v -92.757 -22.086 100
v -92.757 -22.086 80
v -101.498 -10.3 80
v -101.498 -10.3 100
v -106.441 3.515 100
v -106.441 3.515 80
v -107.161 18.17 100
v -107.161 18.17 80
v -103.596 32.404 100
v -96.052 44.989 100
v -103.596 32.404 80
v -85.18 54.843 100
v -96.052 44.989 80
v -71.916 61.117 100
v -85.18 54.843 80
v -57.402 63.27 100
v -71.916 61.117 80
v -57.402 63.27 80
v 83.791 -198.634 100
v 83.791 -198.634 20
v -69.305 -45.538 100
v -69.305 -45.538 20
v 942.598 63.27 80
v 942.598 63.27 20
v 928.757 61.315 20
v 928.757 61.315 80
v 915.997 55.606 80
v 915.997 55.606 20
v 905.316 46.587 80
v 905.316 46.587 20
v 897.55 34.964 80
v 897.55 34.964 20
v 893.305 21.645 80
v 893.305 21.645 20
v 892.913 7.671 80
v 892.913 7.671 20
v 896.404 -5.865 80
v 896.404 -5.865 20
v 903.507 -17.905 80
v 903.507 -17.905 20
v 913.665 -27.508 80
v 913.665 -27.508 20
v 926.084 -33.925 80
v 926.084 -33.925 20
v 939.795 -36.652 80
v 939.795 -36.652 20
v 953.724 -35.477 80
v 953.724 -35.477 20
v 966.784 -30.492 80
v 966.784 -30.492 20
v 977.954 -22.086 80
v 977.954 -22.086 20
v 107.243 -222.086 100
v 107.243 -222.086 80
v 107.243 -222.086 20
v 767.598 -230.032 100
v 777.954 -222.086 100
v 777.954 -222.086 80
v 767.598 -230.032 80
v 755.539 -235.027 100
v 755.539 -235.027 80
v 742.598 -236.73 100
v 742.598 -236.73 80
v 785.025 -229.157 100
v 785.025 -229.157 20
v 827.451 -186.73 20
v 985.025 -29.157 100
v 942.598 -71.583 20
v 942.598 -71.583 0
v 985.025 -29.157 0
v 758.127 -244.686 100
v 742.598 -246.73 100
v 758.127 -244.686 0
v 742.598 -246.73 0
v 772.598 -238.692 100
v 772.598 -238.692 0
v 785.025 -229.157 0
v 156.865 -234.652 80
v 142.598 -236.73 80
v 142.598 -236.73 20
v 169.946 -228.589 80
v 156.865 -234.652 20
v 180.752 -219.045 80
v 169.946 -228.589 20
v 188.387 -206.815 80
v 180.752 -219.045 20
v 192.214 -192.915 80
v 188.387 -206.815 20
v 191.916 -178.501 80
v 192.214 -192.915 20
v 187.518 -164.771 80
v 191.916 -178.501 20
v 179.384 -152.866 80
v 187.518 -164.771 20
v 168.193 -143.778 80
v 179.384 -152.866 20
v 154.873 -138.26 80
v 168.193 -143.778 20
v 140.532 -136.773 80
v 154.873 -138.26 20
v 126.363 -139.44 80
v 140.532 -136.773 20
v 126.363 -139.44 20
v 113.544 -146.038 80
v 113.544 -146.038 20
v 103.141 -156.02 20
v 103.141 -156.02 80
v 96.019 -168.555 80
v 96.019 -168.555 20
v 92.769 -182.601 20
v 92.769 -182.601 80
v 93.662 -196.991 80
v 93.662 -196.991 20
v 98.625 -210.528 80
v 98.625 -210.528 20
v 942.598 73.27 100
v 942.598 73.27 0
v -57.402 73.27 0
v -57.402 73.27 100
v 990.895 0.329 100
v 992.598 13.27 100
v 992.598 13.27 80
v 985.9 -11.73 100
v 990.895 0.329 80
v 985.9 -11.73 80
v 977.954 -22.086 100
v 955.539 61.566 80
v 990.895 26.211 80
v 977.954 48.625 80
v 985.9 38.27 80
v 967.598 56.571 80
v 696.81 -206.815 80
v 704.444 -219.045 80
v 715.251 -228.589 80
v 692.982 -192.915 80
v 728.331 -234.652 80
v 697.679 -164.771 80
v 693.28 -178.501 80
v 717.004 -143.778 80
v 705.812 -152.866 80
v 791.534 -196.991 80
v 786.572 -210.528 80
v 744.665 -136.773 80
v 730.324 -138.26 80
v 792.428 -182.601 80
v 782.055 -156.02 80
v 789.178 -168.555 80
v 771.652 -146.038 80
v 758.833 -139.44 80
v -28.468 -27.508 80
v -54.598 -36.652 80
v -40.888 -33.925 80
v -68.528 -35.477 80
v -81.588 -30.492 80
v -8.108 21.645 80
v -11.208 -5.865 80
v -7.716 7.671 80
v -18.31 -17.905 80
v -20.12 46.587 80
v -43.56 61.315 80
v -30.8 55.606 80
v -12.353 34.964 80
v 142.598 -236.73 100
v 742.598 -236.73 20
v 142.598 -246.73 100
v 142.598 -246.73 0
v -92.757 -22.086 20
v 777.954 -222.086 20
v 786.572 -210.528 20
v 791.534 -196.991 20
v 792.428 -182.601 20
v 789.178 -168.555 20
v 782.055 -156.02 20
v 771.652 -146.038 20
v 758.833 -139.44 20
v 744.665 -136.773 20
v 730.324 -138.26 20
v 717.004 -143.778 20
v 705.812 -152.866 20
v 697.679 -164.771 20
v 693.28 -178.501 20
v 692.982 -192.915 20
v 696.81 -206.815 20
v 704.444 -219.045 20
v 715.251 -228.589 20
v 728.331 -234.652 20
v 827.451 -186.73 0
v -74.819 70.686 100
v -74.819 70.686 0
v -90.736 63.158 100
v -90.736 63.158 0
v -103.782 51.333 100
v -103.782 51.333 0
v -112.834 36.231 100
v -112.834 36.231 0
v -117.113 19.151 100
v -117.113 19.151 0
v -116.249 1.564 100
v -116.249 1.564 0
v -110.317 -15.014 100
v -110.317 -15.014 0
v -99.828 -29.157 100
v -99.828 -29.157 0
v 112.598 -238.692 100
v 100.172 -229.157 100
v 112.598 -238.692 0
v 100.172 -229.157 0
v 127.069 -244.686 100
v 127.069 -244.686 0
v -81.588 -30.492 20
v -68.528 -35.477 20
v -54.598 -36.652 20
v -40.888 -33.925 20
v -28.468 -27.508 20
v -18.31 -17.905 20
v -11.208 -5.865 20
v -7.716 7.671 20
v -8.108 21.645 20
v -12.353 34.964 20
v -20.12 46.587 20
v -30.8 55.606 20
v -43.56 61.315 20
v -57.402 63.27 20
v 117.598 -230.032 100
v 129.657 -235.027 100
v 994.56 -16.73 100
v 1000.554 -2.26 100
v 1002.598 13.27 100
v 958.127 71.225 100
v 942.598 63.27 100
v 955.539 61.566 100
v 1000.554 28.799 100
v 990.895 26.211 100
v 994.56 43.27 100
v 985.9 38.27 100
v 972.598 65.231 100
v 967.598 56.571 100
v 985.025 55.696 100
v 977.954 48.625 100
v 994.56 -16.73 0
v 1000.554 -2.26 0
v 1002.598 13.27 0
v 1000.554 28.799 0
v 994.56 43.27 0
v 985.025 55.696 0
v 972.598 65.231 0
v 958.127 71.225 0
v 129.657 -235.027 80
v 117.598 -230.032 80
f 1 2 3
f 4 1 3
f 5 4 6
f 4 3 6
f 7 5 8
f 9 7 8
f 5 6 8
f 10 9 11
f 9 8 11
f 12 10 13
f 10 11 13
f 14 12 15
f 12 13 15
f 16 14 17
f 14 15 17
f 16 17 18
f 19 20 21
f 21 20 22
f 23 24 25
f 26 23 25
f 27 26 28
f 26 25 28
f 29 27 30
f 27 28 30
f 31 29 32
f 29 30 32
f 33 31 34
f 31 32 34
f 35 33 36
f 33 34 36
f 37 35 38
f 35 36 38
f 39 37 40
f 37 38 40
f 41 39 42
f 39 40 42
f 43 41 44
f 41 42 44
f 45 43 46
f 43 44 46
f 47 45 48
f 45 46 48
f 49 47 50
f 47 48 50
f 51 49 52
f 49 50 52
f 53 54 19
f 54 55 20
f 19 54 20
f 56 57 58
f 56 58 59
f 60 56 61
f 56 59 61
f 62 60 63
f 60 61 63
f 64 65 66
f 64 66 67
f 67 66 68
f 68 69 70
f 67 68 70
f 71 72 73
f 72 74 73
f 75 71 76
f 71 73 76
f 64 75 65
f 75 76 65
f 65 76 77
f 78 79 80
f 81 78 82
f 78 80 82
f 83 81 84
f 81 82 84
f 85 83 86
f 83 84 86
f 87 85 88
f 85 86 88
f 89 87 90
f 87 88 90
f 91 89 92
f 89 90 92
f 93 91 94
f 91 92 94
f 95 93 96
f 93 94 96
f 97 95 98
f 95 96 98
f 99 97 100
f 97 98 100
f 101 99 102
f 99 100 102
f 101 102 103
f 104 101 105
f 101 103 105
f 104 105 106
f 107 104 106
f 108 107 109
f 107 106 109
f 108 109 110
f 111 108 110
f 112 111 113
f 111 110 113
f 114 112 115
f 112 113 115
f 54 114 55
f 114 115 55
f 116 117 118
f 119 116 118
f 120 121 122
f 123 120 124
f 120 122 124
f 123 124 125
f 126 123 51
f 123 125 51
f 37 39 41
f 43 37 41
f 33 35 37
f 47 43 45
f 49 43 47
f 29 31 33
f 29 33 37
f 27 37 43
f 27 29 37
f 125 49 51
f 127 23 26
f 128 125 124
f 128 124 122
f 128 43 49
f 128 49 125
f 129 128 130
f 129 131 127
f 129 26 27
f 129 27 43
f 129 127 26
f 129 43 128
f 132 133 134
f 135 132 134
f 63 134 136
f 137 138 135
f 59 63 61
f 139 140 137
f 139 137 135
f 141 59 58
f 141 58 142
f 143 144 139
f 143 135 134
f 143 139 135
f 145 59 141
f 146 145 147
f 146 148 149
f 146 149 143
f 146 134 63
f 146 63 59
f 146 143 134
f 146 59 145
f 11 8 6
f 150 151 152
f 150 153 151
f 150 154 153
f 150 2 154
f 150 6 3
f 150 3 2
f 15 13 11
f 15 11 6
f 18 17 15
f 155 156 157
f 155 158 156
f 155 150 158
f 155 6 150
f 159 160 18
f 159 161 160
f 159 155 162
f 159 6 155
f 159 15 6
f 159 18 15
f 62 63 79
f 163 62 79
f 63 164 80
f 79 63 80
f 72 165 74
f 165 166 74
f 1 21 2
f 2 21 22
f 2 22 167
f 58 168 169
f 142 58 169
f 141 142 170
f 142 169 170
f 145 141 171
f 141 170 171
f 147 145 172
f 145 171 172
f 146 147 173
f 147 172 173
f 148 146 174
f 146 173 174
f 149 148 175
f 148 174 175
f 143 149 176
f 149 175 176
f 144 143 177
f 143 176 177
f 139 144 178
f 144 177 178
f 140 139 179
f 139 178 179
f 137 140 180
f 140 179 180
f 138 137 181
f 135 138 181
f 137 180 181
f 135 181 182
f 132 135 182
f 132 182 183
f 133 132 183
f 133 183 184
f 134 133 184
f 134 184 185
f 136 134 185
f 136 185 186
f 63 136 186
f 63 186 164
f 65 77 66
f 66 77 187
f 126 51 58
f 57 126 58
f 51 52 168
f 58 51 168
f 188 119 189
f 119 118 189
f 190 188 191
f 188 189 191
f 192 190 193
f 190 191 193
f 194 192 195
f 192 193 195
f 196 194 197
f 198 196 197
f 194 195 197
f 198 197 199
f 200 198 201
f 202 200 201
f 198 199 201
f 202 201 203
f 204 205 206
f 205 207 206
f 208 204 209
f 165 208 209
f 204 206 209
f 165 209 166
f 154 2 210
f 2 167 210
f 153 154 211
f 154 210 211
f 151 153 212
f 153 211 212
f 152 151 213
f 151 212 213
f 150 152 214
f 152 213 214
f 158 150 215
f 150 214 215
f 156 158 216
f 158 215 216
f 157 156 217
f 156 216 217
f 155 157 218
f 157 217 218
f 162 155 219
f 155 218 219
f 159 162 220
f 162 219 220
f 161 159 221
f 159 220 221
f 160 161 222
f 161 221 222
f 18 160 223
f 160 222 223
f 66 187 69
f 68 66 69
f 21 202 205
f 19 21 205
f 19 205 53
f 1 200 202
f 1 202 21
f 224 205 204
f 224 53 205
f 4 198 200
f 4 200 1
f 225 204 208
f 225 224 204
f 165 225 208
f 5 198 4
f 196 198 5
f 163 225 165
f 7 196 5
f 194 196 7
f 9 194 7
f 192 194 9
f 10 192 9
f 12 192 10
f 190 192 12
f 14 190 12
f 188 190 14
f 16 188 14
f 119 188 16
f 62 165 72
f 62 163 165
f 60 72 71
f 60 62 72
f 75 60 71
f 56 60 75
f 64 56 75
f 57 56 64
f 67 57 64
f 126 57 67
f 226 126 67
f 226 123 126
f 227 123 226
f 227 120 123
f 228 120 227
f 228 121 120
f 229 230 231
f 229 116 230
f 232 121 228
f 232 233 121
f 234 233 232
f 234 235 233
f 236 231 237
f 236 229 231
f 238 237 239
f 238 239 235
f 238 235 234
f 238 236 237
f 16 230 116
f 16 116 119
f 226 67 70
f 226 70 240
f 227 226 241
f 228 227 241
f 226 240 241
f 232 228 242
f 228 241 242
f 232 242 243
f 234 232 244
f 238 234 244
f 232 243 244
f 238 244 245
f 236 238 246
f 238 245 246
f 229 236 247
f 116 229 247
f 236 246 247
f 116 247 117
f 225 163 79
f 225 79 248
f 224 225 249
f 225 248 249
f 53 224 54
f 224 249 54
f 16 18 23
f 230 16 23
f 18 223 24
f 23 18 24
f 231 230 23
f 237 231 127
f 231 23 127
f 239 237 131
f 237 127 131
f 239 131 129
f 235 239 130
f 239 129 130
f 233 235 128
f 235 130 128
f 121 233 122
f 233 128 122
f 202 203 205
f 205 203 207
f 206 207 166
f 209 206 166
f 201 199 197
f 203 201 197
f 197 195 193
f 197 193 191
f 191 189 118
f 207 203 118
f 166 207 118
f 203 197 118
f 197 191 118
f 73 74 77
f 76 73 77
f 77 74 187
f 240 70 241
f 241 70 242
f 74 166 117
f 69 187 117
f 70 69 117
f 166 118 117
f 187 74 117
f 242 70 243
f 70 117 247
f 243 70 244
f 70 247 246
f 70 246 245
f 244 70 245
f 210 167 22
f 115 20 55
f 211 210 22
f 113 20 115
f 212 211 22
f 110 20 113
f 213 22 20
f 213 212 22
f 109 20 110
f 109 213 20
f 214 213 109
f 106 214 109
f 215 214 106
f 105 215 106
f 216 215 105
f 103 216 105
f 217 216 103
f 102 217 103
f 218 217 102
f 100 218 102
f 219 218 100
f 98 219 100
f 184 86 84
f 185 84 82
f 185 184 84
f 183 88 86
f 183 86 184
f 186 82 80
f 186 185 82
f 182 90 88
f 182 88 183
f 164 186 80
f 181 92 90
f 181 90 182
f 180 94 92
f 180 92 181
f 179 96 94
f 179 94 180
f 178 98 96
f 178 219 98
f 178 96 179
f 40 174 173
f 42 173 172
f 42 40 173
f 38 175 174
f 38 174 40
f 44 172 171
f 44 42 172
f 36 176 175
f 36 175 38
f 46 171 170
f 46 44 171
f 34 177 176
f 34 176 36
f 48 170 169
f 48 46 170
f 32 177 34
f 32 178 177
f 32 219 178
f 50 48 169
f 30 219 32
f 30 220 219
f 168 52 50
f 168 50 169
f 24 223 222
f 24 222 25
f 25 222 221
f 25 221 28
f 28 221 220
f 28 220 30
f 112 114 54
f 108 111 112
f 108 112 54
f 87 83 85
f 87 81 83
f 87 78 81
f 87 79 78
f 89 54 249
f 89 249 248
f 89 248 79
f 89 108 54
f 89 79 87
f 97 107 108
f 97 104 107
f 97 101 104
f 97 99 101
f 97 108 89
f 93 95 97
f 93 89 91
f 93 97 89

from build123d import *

# Parameters (mm, degrees)
BOSS_EXTRU_1_DEPTH = 20
ESQUISSE2_R        = 50
BOSS_EXTRU_2_DEPTH = 60
BOSS_EXTRU_3_DEPTH = 80


with BuildPart() as part:
    # Esquisse1 → Boss.-Extru.1 (new body)
    with BuildSketch(Plane.XY):
        with BuildLine():
            ThreePointArc((-57.401721965, 73.269601329), (-112.834493915, 36.230607271), (-99.828128836, -29.156805542))
            Line((-99.828128836, -29.156805542), (100.171871164, -229.156805542))
            ThreePointArc((100.171871164, -229.156805542), (119.637272093, -242.163170622), (142.598278035, -246.730398671))
            Line((142.598278035, -246.730398671), (742.598278035, -246.730398671))
            ThreePointArc((742.598278035, -246.730398671), (765.559283977, -242.163170622), (785.024684906, -229.156805542))
            Line((785.024684906, -229.156805542), (985.024684906, -29.156805542))
            ThreePointArc((985.024684906, -29.156805542), (998.031049986, 36.230607271), (942.598278035, 73.269601329))
            Line((942.598278035, 73.269601329), (-57.401721965, 73.269601329))
        make_face()
    extrude(amount=BOSS_EXTRU_1_DEPTH)

    # Esquisse2 → Boss.-Extru.2 (add)
    with BuildSketch(Plane.XY.offset(20)):
        with Locations((-57.401721965, 13.269601329)):
            Circle(ESQUISSE2_R)
        with Locations((942.598278035, 13.269601329)):
            Circle(ESQUISSE2_R)
        with Locations((142.598278035, -186.730398671)):
            Circle(ESQUISSE2_R)
        with Locations((742.598278035, -186.730398671)):
            Circle(ESQUISSE2_R)
    extrude(amount=BOSS_EXTRU_2_DEPTH)

    # Esquisse3 → Boss.-Extru.3 (add)
    with BuildSketch(Plane.XY.offset(20)):
        with BuildLine():
            Line((942.598278035, 73.269601329), (-57.401721965, 73.269601329))
            ThreePointArc((-57.401721965, 73.269601329), (-112.834493915, 36.230607271), (-99.828128836, -29.156805542))
            Line((-99.828128836, -29.156805542), (100.171871164, -229.156805542))
            ThreePointArc((100.171871164, -229.156805542), (119.637272093, -242.163170622), (142.598278035, -246.730398671))
            Line((142.598278035, -246.730398671), (742.598278035, -246.730398671))
            ThreePointArc((742.598278035, -246.730398671), (765.559283977, -242.163170622), (785.024684906, -229.156805542))
            Line((785.024684906, -229.156805542), (985.024684906, -29.156805542))
            ThreePointArc((985.024684906, -29.156805542), (998.031049986, 36.230607271), (942.598278035, 73.269601329))
        make_face()
        with BuildLine():
            ThreePointArc((942.598278035, 63.269601329), (988.792254661, 32.403772947), (977.953617095, -22.08573773))
            Line((977.953617095, -22.08573773), (777.953617095, -222.08573773))
            ThreePointArc((777.953617095, -222.08573773), (761.732449653, -232.924375297), (742.598278035, -236.730398671))
            Line((742.598278035, -236.730398671), (142.598278035, -236.730398671))
            ThreePointArc((142.598278035, -236.730398671), (123.464106417, -232.924375297), (107.242938976, -222.08573773))
            Line((107.242938976, -222.08573773), (-92.757061024, -22.08573773))
            ThreePointArc((-92.757061024, -22.08573773), (-103.59569859, 32.403772947), (-57.401721965, 63.269601329))
            Line((-57.401721965, 63.269601329), (942.598278035, 63.269601329))
        make_face(mode=Mode.SUBTRACT)
    extrude(amount=BOSS_EXTRU_3_DEPTH)


solid = part.part
